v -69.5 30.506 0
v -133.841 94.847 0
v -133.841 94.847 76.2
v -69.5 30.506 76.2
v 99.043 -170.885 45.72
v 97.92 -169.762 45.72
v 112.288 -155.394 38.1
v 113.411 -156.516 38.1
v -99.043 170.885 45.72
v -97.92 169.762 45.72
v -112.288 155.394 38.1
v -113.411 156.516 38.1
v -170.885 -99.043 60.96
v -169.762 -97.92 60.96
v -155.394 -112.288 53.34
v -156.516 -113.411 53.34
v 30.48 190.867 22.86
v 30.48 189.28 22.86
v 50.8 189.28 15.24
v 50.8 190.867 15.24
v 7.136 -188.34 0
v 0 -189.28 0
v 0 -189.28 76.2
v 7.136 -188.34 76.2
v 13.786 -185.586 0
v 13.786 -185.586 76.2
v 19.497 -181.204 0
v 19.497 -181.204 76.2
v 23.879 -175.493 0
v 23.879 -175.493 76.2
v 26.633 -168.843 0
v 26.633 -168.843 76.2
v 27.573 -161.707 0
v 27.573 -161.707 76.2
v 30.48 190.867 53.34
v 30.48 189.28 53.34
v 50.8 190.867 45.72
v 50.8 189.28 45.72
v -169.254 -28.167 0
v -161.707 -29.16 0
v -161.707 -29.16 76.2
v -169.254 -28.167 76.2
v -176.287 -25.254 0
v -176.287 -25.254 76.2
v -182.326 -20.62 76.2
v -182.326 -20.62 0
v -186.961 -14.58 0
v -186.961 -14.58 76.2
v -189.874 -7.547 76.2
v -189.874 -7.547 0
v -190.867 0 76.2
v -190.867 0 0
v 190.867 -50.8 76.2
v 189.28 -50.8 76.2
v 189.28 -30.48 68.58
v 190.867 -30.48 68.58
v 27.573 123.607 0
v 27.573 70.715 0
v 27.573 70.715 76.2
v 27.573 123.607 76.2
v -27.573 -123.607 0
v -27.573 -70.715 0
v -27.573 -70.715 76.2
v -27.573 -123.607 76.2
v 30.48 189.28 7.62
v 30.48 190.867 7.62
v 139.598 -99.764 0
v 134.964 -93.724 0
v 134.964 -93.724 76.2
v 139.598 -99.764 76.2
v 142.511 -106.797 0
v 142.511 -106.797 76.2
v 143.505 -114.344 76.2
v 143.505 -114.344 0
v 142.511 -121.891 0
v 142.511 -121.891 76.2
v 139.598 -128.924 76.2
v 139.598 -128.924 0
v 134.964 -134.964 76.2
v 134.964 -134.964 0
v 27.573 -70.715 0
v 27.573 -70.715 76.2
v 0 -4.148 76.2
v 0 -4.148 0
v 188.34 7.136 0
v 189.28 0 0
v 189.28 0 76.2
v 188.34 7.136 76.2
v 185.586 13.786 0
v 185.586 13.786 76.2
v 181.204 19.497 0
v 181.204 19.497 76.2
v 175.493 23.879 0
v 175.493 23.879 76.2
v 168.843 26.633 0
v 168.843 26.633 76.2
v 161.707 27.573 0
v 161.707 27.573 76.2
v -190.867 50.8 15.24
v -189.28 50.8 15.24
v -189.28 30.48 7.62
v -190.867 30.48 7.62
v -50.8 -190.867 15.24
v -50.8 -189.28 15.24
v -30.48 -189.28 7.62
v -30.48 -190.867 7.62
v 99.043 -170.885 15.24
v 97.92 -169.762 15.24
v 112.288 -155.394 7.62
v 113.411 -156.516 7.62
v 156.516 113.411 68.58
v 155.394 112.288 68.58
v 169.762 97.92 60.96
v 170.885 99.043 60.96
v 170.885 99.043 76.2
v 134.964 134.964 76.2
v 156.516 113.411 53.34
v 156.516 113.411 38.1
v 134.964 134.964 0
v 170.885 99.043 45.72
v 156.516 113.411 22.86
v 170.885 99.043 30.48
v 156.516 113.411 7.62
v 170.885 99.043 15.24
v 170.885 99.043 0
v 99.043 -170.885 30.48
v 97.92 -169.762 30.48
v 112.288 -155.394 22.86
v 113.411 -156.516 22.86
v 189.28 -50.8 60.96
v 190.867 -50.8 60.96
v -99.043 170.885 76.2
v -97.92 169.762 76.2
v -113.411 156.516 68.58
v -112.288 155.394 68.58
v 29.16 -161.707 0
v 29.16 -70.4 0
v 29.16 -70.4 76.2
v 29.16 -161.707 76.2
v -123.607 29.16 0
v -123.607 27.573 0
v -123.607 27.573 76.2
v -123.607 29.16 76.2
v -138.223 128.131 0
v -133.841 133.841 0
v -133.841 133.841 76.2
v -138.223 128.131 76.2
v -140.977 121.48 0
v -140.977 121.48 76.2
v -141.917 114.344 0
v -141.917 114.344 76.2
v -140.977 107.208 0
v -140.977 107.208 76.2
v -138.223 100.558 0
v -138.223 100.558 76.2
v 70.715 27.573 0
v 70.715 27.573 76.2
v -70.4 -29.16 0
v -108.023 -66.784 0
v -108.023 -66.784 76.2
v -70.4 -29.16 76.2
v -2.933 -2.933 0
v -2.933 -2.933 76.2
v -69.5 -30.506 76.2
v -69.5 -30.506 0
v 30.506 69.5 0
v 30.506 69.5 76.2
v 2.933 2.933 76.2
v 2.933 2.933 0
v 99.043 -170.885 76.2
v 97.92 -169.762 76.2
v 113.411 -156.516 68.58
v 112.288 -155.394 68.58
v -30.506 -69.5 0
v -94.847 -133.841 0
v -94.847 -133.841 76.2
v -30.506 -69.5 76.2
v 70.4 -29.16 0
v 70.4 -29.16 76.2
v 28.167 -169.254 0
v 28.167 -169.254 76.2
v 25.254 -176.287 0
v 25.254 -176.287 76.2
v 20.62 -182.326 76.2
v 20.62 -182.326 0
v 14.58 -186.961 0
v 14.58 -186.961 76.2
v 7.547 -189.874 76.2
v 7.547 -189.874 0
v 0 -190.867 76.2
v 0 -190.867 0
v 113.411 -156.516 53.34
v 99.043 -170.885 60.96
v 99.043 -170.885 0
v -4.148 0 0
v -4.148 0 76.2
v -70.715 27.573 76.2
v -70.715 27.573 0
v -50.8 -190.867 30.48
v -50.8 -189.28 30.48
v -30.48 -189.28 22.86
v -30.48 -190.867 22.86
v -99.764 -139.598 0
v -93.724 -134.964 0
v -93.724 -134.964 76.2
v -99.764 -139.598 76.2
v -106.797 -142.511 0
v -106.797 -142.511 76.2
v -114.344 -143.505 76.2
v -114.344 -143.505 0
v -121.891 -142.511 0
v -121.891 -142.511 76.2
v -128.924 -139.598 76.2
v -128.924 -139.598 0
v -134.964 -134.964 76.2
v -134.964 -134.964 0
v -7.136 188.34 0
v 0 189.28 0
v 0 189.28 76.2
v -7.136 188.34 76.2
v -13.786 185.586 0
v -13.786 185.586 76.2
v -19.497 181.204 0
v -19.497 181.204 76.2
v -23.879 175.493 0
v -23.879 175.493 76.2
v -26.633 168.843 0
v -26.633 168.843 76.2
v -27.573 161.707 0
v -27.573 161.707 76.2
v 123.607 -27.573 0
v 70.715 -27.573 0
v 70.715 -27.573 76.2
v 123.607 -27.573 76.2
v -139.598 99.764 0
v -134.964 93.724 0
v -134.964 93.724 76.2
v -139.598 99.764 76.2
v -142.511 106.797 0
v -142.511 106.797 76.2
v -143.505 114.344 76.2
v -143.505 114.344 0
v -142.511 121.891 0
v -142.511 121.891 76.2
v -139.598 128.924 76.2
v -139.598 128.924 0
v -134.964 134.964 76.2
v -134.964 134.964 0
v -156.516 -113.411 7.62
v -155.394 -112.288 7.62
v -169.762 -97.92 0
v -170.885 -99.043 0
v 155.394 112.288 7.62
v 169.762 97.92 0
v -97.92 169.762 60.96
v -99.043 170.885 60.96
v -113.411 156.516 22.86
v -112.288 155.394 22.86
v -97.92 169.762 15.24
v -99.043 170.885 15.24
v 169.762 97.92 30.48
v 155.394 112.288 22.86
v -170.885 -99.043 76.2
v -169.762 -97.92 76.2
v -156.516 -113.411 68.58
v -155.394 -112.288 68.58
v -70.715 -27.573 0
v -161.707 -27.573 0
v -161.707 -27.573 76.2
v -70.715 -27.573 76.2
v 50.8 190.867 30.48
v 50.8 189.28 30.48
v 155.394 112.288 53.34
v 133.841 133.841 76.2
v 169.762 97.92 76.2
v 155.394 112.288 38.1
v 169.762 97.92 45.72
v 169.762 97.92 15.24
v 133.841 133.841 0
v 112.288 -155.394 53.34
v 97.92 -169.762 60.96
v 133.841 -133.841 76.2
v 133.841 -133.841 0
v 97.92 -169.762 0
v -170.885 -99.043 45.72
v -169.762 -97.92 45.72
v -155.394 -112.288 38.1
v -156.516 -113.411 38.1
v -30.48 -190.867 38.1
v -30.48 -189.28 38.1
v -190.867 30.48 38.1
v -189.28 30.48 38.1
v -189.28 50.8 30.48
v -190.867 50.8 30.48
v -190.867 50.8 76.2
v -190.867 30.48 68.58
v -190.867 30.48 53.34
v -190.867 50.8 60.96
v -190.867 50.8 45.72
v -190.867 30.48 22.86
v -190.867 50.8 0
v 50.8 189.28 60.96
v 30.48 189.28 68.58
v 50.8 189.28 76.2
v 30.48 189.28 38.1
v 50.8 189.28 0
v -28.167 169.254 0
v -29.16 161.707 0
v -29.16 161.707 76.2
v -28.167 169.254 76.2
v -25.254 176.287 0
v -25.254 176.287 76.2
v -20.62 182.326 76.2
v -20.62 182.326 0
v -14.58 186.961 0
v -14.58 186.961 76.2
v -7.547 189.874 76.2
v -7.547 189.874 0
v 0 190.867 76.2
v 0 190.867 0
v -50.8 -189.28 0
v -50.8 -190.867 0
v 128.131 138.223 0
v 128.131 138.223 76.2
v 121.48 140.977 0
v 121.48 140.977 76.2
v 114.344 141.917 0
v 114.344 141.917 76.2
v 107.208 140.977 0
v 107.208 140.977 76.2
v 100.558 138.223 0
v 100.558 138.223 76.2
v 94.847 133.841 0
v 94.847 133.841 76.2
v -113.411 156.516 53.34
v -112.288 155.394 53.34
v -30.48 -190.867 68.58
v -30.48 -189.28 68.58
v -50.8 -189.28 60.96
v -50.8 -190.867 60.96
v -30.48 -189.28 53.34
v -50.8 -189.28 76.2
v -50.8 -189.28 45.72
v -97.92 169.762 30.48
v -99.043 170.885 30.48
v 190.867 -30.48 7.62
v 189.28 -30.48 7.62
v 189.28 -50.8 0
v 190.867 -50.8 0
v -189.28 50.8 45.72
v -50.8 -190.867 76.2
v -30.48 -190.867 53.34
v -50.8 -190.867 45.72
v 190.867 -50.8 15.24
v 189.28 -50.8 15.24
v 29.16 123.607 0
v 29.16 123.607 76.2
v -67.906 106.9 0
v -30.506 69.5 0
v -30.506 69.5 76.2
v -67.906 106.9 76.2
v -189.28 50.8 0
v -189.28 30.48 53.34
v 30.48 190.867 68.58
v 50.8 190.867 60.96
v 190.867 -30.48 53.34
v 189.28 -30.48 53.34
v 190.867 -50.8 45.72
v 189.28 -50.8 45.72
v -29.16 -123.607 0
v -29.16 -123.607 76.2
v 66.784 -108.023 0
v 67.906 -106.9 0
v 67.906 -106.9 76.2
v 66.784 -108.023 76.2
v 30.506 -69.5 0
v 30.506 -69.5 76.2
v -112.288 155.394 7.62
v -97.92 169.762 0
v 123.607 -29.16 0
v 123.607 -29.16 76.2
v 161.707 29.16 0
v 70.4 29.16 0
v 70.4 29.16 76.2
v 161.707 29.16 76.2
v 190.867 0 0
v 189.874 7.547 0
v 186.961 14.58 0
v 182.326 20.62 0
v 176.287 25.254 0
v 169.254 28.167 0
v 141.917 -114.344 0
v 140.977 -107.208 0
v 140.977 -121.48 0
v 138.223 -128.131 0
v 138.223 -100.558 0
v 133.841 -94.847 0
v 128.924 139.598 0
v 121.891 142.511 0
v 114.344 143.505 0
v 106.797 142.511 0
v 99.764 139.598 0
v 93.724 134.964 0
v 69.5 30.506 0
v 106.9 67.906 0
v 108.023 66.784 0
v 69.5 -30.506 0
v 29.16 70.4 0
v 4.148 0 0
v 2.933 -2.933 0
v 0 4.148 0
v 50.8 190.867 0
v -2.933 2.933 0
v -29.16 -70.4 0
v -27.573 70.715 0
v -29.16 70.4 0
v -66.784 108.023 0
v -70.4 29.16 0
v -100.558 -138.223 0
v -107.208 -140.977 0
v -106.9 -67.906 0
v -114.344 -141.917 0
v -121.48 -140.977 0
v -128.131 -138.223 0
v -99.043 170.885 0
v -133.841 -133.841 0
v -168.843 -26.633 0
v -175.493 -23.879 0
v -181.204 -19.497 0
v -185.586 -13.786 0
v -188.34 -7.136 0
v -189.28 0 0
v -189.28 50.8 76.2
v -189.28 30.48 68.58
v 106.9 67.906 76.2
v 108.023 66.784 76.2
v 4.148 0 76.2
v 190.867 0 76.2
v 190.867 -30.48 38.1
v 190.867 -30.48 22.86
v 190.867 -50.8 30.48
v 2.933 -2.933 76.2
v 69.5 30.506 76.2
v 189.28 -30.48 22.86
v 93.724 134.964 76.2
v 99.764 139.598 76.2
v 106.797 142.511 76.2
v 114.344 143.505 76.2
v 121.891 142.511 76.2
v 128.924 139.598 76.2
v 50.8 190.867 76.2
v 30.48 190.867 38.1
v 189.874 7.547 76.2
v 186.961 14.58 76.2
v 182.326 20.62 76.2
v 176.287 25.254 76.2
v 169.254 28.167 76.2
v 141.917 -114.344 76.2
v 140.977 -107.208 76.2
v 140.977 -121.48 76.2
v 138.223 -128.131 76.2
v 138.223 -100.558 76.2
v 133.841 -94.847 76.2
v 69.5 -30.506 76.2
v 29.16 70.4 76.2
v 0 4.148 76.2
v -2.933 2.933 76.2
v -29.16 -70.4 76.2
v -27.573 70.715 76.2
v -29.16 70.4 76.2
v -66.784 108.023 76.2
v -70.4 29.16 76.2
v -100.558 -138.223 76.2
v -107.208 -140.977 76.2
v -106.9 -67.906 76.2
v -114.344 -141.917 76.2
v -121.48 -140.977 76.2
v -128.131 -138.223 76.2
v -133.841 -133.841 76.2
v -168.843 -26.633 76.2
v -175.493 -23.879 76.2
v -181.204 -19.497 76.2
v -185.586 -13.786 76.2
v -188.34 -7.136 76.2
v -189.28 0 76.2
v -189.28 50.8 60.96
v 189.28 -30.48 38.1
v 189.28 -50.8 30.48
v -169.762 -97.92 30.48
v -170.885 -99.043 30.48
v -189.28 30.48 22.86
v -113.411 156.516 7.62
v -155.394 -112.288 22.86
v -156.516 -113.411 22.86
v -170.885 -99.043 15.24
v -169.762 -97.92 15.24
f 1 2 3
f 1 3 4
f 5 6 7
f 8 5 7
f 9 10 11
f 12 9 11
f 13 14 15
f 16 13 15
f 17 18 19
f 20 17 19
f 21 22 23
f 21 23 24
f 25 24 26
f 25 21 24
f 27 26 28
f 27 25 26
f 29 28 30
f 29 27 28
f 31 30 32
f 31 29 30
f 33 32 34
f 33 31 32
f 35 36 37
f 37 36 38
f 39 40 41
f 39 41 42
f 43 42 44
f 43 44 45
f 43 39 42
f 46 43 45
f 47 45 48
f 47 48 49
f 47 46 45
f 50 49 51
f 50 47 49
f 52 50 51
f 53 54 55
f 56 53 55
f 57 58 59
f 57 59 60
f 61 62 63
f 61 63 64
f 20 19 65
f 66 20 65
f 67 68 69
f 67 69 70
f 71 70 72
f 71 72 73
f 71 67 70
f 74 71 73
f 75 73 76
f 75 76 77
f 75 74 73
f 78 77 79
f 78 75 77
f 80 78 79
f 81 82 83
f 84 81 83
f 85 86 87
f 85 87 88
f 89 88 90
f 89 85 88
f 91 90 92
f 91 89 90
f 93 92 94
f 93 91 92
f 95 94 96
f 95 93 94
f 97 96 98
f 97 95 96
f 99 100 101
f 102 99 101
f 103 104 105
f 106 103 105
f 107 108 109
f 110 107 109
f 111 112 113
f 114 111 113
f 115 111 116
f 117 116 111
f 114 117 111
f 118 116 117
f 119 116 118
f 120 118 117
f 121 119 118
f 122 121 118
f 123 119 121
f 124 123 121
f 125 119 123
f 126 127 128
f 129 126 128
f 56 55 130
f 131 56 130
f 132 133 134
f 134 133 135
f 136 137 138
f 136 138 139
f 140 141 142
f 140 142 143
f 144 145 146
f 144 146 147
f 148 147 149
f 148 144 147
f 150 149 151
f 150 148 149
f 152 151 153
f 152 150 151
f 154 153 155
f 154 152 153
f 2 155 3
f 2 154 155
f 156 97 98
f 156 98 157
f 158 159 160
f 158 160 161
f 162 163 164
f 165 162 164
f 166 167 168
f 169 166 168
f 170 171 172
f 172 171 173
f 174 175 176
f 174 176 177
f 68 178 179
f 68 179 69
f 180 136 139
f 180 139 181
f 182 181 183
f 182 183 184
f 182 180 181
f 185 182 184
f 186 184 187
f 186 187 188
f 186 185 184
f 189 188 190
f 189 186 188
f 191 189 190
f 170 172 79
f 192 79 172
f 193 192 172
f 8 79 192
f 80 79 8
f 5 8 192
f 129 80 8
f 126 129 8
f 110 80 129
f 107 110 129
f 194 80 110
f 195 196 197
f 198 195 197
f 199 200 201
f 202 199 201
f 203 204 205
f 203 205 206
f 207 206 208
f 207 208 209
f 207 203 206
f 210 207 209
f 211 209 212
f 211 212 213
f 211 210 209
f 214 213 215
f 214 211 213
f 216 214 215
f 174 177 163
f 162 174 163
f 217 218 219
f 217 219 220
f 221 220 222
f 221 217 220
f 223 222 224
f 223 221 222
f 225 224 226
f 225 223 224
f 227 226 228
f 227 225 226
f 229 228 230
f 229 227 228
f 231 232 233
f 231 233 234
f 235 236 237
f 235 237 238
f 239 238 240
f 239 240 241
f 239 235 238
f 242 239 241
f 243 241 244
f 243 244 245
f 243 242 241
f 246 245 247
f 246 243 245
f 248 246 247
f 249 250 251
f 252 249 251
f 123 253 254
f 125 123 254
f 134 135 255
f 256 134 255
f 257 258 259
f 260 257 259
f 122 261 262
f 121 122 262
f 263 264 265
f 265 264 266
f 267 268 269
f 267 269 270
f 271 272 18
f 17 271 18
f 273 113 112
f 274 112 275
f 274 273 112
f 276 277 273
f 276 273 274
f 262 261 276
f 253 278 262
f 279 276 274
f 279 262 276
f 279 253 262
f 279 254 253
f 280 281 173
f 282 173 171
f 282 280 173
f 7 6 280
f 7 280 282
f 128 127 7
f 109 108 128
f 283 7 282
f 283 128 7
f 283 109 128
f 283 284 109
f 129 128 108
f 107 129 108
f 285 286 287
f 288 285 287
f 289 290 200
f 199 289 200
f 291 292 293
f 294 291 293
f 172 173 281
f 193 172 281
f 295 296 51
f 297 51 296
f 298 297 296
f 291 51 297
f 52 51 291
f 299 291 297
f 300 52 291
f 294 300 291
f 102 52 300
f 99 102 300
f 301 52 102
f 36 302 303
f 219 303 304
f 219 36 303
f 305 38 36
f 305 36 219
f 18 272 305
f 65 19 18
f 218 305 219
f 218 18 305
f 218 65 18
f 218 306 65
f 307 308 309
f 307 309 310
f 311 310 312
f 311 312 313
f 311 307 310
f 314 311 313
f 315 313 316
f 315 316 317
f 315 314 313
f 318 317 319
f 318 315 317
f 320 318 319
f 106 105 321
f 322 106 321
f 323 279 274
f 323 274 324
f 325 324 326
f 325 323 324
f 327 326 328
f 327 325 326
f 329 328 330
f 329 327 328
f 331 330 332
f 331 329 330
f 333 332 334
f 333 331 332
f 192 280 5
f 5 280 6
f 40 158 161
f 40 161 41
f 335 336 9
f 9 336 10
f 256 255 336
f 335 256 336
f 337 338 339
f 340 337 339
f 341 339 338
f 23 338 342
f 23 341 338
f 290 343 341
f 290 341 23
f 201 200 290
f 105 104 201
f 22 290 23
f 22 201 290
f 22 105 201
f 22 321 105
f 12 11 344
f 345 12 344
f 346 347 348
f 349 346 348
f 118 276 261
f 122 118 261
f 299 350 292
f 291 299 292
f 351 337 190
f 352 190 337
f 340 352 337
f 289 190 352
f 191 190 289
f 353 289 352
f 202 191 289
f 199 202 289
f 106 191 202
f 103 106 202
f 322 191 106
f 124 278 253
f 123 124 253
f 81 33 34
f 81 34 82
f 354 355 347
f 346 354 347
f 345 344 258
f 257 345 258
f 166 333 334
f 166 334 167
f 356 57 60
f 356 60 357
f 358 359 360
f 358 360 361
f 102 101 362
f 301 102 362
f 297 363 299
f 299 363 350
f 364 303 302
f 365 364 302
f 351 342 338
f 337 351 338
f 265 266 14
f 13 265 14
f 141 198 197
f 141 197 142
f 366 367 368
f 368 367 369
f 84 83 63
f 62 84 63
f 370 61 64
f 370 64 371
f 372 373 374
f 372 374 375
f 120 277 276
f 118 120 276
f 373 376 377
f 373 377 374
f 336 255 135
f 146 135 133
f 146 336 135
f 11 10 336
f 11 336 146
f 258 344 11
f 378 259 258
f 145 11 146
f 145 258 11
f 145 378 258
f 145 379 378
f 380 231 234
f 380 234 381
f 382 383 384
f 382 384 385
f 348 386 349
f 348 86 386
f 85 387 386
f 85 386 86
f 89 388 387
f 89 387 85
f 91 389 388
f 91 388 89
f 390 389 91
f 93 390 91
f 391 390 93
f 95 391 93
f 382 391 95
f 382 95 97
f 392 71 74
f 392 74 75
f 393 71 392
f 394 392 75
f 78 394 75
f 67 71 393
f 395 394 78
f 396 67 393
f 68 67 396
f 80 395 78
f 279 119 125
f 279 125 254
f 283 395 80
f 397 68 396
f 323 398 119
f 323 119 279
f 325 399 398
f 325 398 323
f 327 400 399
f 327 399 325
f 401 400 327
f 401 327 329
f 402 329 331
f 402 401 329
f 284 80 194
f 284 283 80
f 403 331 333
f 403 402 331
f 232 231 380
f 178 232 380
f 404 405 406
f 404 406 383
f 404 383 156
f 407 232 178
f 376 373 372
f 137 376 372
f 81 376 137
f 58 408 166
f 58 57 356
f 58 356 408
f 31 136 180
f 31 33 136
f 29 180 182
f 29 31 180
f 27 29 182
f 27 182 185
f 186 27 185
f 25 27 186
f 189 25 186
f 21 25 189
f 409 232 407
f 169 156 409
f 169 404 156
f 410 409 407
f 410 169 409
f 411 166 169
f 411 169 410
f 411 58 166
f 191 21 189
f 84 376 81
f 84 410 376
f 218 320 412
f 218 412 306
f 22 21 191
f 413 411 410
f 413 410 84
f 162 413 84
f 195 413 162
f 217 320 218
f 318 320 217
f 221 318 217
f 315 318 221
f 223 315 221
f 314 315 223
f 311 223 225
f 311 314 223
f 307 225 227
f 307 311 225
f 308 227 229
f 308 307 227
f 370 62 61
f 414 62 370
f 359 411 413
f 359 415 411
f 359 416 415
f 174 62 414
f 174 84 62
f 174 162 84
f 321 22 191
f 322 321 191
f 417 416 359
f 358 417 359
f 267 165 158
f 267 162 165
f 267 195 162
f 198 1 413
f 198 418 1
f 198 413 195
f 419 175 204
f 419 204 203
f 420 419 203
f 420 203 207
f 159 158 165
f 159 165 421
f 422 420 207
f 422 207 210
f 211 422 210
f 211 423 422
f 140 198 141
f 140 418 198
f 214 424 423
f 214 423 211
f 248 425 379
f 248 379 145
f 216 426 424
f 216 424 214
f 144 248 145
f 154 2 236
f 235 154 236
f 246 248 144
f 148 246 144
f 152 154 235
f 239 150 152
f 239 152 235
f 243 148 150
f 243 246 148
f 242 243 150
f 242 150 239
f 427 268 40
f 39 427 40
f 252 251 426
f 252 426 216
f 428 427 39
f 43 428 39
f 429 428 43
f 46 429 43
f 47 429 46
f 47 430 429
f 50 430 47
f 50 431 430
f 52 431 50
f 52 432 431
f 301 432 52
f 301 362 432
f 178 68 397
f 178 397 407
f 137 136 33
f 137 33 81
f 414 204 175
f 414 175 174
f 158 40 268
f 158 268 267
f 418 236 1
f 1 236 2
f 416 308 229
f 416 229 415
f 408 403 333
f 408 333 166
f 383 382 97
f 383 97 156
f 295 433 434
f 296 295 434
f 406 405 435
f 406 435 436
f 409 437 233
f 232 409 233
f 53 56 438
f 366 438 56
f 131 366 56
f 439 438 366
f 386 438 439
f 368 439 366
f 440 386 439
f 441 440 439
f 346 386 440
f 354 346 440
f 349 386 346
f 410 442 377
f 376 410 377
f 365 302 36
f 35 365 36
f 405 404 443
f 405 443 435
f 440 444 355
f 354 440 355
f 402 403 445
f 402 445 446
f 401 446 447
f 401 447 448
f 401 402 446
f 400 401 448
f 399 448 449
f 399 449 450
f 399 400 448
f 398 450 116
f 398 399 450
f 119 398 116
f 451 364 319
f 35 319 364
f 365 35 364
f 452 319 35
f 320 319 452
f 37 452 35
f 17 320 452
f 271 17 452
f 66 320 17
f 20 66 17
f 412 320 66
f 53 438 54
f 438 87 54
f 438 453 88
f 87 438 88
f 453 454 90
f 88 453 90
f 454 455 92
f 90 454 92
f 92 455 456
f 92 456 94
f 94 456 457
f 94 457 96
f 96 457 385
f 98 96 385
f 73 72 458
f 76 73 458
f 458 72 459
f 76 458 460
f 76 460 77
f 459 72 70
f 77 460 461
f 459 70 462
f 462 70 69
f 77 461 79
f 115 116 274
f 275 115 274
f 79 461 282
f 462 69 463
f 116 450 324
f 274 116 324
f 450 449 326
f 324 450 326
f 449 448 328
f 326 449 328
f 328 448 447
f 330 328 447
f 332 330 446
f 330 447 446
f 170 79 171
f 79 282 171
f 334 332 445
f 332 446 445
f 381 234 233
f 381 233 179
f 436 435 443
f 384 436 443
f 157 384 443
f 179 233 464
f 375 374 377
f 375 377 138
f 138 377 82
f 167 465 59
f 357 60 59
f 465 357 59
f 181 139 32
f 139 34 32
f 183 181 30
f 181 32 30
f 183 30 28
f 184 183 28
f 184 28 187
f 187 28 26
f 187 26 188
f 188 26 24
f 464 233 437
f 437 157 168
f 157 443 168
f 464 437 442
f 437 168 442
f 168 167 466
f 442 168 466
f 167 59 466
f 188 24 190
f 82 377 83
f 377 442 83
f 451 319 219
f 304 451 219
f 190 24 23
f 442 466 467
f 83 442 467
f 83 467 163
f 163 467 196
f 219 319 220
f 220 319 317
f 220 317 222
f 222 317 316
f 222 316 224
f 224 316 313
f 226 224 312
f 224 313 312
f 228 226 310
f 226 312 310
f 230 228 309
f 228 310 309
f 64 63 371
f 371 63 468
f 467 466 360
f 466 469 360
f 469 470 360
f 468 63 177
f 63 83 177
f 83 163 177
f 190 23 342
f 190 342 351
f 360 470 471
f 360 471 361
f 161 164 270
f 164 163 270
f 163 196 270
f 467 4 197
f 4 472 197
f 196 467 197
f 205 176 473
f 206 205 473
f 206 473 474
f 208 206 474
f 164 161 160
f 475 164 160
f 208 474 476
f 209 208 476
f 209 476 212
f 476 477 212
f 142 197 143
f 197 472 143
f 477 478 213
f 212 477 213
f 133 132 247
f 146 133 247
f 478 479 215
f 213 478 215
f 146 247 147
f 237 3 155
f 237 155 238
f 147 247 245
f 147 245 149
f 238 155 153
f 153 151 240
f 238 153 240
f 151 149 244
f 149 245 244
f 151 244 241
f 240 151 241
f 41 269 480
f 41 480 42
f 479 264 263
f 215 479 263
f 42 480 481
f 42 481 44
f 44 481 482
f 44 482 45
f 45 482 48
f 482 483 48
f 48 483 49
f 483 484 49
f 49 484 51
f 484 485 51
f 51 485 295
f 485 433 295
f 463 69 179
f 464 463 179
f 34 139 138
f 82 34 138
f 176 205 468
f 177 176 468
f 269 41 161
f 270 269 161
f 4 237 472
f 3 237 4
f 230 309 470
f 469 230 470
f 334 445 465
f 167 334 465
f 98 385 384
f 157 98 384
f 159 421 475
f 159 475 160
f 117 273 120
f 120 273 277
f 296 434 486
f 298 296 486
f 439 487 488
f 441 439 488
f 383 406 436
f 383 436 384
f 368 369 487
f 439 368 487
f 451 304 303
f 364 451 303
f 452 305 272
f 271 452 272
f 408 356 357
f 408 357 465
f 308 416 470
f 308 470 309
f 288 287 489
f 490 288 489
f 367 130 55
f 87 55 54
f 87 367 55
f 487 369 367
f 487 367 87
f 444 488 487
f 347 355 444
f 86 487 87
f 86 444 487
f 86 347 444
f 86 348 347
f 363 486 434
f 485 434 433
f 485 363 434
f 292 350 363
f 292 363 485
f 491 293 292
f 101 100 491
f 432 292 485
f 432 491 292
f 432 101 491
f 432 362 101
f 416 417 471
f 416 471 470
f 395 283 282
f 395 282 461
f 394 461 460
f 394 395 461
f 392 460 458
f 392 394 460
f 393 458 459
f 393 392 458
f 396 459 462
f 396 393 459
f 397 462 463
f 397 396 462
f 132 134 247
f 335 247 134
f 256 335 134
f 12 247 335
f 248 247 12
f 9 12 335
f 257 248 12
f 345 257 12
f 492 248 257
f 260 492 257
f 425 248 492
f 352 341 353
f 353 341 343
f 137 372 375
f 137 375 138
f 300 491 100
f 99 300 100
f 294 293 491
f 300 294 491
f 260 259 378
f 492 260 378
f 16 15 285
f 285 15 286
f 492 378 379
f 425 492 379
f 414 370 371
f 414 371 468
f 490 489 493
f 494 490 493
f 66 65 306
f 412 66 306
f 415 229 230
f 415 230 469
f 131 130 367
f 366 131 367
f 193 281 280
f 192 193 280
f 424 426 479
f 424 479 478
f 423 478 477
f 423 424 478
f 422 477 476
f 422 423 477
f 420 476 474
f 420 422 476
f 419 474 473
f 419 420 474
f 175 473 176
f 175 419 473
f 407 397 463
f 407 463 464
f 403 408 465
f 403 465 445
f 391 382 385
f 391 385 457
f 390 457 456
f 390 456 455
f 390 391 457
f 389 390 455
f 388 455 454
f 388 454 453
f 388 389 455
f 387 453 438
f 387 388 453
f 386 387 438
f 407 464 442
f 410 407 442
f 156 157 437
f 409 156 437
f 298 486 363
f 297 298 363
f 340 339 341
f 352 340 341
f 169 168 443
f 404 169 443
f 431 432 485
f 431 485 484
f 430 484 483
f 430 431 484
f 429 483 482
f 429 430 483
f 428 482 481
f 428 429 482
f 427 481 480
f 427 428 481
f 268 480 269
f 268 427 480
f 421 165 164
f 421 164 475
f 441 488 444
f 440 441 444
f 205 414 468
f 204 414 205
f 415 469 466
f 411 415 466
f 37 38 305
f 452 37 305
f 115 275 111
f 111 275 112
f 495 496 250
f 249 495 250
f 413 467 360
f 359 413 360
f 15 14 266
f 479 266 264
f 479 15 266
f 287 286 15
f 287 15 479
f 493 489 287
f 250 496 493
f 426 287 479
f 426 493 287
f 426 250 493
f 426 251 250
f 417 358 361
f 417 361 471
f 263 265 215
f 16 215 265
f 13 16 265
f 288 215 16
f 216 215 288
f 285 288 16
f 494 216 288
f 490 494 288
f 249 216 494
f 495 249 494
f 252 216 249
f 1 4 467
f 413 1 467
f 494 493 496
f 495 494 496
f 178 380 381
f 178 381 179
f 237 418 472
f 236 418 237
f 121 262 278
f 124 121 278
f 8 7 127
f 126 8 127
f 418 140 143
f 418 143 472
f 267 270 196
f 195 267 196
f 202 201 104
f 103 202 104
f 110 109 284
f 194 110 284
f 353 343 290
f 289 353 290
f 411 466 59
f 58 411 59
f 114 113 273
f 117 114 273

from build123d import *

# Parameters (mm, degrees)
BOSS_EXTRUDE1_DEPTH = 76.2
CUT_EXTRUDE2_START  = -1.5875
CUT_EXTRUDE2_DEPTH  = 1.5875
CIRPATTERN10_COUNT  = 8


with BuildPart() as part:
    # Sketch2 → Boss-Extrude1 (new body)
    with BuildSketch(Plane.XY):
        with BuildLine():
            Line((0, 0), (29.160477546, -70.399620377))
            Line((29.160477546, -70.399620377), (29.160477546, -123.606903324))
            Line((29.160477546, -123.606903324), (29.160477546, -161.706903324))
            ThreePointArc((29.160477546, -161.706903324), (20.619571416, -182.326474739), (0, -190.86738087))
            Line((0, -190.86738087), (-50.8, -190.86738087))
            Line((-50.8, -190.86738087), (-50.8, -189.27988087))
            Line((-50.8, -189.27988087), (0, -189.27988087))
            ThreePointArc((0, -189.27988087), (19.4970394, -181.203942724), (27.572977546, -161.706903324))
            Line((27.572977546, -161.706903324), (27.572977546, -123.606903324))
            Line((27.572977546, -123.606903324), (27.572977546, -70.715393761))
            Line((27.572977546, -70.715393761), (0, -4.148337413))
            Line((0, -4.148337413), (-27.572977546, -70.715393761))
            Line((-27.572977546, -70.715393761), (-27.572977546, -123.606903324))
            Line((-27.572977546, -123.606903324), (-29.160477546, -123.606903324))
            Line((-29.160477546, -123.606903324), (-29.160477546, -70.399620377))
            Line((-29.160477546, -70.399620377), (0, 0))
        make_face()
    boss_extrude1 = extrude(amount=BOSS_EXTRUDE1_DEPTH)

    # Sketch5 → Cut-Extrude2 (cut)
    with BuildSketch(Plane.XZ.offset(190.86738087).offset(CUT_EXTRUDE2_START)):
        Polygon((-50.8, 76.2), (-30.48, 68.58), (-50.8, 60.96), (-30.48, 53.34), (-50.8, 45.72), (-30.48, 38.1), (-50.8, 30.48), (-30.48, 22.86), (-50.8, 15.24), (-30.48, 7.62), (-50.8, 0), (-53.34, 0), (-53.34, 76.2), align=None)
    cut_extrude2 = extrude(amount=CUT_EXTRUDE2_DEPTH, mode=Mode.SUBTRACT)

    # CirPattern10: Boss-Extrude1, Cut-Extrude2 ×8 about axis
    cirpattern10_axis = Axis((0, 0, 0), (0, 0, 1))
    add([boss_extrude1.rotate(cirpattern10_axis, i * 360 / CIRPATTERN10_COUNT) for i in range(1, CIRPATTERN10_COUNT)])
    add([cut_extrude2.rotate(cirpattern10_axis, i * 360 / CIRPATTERN10_COUNT) for i in range(1, CIRPATTERN10_COUNT)], mode=Mode.SUBTRACT)


solid = part.part
